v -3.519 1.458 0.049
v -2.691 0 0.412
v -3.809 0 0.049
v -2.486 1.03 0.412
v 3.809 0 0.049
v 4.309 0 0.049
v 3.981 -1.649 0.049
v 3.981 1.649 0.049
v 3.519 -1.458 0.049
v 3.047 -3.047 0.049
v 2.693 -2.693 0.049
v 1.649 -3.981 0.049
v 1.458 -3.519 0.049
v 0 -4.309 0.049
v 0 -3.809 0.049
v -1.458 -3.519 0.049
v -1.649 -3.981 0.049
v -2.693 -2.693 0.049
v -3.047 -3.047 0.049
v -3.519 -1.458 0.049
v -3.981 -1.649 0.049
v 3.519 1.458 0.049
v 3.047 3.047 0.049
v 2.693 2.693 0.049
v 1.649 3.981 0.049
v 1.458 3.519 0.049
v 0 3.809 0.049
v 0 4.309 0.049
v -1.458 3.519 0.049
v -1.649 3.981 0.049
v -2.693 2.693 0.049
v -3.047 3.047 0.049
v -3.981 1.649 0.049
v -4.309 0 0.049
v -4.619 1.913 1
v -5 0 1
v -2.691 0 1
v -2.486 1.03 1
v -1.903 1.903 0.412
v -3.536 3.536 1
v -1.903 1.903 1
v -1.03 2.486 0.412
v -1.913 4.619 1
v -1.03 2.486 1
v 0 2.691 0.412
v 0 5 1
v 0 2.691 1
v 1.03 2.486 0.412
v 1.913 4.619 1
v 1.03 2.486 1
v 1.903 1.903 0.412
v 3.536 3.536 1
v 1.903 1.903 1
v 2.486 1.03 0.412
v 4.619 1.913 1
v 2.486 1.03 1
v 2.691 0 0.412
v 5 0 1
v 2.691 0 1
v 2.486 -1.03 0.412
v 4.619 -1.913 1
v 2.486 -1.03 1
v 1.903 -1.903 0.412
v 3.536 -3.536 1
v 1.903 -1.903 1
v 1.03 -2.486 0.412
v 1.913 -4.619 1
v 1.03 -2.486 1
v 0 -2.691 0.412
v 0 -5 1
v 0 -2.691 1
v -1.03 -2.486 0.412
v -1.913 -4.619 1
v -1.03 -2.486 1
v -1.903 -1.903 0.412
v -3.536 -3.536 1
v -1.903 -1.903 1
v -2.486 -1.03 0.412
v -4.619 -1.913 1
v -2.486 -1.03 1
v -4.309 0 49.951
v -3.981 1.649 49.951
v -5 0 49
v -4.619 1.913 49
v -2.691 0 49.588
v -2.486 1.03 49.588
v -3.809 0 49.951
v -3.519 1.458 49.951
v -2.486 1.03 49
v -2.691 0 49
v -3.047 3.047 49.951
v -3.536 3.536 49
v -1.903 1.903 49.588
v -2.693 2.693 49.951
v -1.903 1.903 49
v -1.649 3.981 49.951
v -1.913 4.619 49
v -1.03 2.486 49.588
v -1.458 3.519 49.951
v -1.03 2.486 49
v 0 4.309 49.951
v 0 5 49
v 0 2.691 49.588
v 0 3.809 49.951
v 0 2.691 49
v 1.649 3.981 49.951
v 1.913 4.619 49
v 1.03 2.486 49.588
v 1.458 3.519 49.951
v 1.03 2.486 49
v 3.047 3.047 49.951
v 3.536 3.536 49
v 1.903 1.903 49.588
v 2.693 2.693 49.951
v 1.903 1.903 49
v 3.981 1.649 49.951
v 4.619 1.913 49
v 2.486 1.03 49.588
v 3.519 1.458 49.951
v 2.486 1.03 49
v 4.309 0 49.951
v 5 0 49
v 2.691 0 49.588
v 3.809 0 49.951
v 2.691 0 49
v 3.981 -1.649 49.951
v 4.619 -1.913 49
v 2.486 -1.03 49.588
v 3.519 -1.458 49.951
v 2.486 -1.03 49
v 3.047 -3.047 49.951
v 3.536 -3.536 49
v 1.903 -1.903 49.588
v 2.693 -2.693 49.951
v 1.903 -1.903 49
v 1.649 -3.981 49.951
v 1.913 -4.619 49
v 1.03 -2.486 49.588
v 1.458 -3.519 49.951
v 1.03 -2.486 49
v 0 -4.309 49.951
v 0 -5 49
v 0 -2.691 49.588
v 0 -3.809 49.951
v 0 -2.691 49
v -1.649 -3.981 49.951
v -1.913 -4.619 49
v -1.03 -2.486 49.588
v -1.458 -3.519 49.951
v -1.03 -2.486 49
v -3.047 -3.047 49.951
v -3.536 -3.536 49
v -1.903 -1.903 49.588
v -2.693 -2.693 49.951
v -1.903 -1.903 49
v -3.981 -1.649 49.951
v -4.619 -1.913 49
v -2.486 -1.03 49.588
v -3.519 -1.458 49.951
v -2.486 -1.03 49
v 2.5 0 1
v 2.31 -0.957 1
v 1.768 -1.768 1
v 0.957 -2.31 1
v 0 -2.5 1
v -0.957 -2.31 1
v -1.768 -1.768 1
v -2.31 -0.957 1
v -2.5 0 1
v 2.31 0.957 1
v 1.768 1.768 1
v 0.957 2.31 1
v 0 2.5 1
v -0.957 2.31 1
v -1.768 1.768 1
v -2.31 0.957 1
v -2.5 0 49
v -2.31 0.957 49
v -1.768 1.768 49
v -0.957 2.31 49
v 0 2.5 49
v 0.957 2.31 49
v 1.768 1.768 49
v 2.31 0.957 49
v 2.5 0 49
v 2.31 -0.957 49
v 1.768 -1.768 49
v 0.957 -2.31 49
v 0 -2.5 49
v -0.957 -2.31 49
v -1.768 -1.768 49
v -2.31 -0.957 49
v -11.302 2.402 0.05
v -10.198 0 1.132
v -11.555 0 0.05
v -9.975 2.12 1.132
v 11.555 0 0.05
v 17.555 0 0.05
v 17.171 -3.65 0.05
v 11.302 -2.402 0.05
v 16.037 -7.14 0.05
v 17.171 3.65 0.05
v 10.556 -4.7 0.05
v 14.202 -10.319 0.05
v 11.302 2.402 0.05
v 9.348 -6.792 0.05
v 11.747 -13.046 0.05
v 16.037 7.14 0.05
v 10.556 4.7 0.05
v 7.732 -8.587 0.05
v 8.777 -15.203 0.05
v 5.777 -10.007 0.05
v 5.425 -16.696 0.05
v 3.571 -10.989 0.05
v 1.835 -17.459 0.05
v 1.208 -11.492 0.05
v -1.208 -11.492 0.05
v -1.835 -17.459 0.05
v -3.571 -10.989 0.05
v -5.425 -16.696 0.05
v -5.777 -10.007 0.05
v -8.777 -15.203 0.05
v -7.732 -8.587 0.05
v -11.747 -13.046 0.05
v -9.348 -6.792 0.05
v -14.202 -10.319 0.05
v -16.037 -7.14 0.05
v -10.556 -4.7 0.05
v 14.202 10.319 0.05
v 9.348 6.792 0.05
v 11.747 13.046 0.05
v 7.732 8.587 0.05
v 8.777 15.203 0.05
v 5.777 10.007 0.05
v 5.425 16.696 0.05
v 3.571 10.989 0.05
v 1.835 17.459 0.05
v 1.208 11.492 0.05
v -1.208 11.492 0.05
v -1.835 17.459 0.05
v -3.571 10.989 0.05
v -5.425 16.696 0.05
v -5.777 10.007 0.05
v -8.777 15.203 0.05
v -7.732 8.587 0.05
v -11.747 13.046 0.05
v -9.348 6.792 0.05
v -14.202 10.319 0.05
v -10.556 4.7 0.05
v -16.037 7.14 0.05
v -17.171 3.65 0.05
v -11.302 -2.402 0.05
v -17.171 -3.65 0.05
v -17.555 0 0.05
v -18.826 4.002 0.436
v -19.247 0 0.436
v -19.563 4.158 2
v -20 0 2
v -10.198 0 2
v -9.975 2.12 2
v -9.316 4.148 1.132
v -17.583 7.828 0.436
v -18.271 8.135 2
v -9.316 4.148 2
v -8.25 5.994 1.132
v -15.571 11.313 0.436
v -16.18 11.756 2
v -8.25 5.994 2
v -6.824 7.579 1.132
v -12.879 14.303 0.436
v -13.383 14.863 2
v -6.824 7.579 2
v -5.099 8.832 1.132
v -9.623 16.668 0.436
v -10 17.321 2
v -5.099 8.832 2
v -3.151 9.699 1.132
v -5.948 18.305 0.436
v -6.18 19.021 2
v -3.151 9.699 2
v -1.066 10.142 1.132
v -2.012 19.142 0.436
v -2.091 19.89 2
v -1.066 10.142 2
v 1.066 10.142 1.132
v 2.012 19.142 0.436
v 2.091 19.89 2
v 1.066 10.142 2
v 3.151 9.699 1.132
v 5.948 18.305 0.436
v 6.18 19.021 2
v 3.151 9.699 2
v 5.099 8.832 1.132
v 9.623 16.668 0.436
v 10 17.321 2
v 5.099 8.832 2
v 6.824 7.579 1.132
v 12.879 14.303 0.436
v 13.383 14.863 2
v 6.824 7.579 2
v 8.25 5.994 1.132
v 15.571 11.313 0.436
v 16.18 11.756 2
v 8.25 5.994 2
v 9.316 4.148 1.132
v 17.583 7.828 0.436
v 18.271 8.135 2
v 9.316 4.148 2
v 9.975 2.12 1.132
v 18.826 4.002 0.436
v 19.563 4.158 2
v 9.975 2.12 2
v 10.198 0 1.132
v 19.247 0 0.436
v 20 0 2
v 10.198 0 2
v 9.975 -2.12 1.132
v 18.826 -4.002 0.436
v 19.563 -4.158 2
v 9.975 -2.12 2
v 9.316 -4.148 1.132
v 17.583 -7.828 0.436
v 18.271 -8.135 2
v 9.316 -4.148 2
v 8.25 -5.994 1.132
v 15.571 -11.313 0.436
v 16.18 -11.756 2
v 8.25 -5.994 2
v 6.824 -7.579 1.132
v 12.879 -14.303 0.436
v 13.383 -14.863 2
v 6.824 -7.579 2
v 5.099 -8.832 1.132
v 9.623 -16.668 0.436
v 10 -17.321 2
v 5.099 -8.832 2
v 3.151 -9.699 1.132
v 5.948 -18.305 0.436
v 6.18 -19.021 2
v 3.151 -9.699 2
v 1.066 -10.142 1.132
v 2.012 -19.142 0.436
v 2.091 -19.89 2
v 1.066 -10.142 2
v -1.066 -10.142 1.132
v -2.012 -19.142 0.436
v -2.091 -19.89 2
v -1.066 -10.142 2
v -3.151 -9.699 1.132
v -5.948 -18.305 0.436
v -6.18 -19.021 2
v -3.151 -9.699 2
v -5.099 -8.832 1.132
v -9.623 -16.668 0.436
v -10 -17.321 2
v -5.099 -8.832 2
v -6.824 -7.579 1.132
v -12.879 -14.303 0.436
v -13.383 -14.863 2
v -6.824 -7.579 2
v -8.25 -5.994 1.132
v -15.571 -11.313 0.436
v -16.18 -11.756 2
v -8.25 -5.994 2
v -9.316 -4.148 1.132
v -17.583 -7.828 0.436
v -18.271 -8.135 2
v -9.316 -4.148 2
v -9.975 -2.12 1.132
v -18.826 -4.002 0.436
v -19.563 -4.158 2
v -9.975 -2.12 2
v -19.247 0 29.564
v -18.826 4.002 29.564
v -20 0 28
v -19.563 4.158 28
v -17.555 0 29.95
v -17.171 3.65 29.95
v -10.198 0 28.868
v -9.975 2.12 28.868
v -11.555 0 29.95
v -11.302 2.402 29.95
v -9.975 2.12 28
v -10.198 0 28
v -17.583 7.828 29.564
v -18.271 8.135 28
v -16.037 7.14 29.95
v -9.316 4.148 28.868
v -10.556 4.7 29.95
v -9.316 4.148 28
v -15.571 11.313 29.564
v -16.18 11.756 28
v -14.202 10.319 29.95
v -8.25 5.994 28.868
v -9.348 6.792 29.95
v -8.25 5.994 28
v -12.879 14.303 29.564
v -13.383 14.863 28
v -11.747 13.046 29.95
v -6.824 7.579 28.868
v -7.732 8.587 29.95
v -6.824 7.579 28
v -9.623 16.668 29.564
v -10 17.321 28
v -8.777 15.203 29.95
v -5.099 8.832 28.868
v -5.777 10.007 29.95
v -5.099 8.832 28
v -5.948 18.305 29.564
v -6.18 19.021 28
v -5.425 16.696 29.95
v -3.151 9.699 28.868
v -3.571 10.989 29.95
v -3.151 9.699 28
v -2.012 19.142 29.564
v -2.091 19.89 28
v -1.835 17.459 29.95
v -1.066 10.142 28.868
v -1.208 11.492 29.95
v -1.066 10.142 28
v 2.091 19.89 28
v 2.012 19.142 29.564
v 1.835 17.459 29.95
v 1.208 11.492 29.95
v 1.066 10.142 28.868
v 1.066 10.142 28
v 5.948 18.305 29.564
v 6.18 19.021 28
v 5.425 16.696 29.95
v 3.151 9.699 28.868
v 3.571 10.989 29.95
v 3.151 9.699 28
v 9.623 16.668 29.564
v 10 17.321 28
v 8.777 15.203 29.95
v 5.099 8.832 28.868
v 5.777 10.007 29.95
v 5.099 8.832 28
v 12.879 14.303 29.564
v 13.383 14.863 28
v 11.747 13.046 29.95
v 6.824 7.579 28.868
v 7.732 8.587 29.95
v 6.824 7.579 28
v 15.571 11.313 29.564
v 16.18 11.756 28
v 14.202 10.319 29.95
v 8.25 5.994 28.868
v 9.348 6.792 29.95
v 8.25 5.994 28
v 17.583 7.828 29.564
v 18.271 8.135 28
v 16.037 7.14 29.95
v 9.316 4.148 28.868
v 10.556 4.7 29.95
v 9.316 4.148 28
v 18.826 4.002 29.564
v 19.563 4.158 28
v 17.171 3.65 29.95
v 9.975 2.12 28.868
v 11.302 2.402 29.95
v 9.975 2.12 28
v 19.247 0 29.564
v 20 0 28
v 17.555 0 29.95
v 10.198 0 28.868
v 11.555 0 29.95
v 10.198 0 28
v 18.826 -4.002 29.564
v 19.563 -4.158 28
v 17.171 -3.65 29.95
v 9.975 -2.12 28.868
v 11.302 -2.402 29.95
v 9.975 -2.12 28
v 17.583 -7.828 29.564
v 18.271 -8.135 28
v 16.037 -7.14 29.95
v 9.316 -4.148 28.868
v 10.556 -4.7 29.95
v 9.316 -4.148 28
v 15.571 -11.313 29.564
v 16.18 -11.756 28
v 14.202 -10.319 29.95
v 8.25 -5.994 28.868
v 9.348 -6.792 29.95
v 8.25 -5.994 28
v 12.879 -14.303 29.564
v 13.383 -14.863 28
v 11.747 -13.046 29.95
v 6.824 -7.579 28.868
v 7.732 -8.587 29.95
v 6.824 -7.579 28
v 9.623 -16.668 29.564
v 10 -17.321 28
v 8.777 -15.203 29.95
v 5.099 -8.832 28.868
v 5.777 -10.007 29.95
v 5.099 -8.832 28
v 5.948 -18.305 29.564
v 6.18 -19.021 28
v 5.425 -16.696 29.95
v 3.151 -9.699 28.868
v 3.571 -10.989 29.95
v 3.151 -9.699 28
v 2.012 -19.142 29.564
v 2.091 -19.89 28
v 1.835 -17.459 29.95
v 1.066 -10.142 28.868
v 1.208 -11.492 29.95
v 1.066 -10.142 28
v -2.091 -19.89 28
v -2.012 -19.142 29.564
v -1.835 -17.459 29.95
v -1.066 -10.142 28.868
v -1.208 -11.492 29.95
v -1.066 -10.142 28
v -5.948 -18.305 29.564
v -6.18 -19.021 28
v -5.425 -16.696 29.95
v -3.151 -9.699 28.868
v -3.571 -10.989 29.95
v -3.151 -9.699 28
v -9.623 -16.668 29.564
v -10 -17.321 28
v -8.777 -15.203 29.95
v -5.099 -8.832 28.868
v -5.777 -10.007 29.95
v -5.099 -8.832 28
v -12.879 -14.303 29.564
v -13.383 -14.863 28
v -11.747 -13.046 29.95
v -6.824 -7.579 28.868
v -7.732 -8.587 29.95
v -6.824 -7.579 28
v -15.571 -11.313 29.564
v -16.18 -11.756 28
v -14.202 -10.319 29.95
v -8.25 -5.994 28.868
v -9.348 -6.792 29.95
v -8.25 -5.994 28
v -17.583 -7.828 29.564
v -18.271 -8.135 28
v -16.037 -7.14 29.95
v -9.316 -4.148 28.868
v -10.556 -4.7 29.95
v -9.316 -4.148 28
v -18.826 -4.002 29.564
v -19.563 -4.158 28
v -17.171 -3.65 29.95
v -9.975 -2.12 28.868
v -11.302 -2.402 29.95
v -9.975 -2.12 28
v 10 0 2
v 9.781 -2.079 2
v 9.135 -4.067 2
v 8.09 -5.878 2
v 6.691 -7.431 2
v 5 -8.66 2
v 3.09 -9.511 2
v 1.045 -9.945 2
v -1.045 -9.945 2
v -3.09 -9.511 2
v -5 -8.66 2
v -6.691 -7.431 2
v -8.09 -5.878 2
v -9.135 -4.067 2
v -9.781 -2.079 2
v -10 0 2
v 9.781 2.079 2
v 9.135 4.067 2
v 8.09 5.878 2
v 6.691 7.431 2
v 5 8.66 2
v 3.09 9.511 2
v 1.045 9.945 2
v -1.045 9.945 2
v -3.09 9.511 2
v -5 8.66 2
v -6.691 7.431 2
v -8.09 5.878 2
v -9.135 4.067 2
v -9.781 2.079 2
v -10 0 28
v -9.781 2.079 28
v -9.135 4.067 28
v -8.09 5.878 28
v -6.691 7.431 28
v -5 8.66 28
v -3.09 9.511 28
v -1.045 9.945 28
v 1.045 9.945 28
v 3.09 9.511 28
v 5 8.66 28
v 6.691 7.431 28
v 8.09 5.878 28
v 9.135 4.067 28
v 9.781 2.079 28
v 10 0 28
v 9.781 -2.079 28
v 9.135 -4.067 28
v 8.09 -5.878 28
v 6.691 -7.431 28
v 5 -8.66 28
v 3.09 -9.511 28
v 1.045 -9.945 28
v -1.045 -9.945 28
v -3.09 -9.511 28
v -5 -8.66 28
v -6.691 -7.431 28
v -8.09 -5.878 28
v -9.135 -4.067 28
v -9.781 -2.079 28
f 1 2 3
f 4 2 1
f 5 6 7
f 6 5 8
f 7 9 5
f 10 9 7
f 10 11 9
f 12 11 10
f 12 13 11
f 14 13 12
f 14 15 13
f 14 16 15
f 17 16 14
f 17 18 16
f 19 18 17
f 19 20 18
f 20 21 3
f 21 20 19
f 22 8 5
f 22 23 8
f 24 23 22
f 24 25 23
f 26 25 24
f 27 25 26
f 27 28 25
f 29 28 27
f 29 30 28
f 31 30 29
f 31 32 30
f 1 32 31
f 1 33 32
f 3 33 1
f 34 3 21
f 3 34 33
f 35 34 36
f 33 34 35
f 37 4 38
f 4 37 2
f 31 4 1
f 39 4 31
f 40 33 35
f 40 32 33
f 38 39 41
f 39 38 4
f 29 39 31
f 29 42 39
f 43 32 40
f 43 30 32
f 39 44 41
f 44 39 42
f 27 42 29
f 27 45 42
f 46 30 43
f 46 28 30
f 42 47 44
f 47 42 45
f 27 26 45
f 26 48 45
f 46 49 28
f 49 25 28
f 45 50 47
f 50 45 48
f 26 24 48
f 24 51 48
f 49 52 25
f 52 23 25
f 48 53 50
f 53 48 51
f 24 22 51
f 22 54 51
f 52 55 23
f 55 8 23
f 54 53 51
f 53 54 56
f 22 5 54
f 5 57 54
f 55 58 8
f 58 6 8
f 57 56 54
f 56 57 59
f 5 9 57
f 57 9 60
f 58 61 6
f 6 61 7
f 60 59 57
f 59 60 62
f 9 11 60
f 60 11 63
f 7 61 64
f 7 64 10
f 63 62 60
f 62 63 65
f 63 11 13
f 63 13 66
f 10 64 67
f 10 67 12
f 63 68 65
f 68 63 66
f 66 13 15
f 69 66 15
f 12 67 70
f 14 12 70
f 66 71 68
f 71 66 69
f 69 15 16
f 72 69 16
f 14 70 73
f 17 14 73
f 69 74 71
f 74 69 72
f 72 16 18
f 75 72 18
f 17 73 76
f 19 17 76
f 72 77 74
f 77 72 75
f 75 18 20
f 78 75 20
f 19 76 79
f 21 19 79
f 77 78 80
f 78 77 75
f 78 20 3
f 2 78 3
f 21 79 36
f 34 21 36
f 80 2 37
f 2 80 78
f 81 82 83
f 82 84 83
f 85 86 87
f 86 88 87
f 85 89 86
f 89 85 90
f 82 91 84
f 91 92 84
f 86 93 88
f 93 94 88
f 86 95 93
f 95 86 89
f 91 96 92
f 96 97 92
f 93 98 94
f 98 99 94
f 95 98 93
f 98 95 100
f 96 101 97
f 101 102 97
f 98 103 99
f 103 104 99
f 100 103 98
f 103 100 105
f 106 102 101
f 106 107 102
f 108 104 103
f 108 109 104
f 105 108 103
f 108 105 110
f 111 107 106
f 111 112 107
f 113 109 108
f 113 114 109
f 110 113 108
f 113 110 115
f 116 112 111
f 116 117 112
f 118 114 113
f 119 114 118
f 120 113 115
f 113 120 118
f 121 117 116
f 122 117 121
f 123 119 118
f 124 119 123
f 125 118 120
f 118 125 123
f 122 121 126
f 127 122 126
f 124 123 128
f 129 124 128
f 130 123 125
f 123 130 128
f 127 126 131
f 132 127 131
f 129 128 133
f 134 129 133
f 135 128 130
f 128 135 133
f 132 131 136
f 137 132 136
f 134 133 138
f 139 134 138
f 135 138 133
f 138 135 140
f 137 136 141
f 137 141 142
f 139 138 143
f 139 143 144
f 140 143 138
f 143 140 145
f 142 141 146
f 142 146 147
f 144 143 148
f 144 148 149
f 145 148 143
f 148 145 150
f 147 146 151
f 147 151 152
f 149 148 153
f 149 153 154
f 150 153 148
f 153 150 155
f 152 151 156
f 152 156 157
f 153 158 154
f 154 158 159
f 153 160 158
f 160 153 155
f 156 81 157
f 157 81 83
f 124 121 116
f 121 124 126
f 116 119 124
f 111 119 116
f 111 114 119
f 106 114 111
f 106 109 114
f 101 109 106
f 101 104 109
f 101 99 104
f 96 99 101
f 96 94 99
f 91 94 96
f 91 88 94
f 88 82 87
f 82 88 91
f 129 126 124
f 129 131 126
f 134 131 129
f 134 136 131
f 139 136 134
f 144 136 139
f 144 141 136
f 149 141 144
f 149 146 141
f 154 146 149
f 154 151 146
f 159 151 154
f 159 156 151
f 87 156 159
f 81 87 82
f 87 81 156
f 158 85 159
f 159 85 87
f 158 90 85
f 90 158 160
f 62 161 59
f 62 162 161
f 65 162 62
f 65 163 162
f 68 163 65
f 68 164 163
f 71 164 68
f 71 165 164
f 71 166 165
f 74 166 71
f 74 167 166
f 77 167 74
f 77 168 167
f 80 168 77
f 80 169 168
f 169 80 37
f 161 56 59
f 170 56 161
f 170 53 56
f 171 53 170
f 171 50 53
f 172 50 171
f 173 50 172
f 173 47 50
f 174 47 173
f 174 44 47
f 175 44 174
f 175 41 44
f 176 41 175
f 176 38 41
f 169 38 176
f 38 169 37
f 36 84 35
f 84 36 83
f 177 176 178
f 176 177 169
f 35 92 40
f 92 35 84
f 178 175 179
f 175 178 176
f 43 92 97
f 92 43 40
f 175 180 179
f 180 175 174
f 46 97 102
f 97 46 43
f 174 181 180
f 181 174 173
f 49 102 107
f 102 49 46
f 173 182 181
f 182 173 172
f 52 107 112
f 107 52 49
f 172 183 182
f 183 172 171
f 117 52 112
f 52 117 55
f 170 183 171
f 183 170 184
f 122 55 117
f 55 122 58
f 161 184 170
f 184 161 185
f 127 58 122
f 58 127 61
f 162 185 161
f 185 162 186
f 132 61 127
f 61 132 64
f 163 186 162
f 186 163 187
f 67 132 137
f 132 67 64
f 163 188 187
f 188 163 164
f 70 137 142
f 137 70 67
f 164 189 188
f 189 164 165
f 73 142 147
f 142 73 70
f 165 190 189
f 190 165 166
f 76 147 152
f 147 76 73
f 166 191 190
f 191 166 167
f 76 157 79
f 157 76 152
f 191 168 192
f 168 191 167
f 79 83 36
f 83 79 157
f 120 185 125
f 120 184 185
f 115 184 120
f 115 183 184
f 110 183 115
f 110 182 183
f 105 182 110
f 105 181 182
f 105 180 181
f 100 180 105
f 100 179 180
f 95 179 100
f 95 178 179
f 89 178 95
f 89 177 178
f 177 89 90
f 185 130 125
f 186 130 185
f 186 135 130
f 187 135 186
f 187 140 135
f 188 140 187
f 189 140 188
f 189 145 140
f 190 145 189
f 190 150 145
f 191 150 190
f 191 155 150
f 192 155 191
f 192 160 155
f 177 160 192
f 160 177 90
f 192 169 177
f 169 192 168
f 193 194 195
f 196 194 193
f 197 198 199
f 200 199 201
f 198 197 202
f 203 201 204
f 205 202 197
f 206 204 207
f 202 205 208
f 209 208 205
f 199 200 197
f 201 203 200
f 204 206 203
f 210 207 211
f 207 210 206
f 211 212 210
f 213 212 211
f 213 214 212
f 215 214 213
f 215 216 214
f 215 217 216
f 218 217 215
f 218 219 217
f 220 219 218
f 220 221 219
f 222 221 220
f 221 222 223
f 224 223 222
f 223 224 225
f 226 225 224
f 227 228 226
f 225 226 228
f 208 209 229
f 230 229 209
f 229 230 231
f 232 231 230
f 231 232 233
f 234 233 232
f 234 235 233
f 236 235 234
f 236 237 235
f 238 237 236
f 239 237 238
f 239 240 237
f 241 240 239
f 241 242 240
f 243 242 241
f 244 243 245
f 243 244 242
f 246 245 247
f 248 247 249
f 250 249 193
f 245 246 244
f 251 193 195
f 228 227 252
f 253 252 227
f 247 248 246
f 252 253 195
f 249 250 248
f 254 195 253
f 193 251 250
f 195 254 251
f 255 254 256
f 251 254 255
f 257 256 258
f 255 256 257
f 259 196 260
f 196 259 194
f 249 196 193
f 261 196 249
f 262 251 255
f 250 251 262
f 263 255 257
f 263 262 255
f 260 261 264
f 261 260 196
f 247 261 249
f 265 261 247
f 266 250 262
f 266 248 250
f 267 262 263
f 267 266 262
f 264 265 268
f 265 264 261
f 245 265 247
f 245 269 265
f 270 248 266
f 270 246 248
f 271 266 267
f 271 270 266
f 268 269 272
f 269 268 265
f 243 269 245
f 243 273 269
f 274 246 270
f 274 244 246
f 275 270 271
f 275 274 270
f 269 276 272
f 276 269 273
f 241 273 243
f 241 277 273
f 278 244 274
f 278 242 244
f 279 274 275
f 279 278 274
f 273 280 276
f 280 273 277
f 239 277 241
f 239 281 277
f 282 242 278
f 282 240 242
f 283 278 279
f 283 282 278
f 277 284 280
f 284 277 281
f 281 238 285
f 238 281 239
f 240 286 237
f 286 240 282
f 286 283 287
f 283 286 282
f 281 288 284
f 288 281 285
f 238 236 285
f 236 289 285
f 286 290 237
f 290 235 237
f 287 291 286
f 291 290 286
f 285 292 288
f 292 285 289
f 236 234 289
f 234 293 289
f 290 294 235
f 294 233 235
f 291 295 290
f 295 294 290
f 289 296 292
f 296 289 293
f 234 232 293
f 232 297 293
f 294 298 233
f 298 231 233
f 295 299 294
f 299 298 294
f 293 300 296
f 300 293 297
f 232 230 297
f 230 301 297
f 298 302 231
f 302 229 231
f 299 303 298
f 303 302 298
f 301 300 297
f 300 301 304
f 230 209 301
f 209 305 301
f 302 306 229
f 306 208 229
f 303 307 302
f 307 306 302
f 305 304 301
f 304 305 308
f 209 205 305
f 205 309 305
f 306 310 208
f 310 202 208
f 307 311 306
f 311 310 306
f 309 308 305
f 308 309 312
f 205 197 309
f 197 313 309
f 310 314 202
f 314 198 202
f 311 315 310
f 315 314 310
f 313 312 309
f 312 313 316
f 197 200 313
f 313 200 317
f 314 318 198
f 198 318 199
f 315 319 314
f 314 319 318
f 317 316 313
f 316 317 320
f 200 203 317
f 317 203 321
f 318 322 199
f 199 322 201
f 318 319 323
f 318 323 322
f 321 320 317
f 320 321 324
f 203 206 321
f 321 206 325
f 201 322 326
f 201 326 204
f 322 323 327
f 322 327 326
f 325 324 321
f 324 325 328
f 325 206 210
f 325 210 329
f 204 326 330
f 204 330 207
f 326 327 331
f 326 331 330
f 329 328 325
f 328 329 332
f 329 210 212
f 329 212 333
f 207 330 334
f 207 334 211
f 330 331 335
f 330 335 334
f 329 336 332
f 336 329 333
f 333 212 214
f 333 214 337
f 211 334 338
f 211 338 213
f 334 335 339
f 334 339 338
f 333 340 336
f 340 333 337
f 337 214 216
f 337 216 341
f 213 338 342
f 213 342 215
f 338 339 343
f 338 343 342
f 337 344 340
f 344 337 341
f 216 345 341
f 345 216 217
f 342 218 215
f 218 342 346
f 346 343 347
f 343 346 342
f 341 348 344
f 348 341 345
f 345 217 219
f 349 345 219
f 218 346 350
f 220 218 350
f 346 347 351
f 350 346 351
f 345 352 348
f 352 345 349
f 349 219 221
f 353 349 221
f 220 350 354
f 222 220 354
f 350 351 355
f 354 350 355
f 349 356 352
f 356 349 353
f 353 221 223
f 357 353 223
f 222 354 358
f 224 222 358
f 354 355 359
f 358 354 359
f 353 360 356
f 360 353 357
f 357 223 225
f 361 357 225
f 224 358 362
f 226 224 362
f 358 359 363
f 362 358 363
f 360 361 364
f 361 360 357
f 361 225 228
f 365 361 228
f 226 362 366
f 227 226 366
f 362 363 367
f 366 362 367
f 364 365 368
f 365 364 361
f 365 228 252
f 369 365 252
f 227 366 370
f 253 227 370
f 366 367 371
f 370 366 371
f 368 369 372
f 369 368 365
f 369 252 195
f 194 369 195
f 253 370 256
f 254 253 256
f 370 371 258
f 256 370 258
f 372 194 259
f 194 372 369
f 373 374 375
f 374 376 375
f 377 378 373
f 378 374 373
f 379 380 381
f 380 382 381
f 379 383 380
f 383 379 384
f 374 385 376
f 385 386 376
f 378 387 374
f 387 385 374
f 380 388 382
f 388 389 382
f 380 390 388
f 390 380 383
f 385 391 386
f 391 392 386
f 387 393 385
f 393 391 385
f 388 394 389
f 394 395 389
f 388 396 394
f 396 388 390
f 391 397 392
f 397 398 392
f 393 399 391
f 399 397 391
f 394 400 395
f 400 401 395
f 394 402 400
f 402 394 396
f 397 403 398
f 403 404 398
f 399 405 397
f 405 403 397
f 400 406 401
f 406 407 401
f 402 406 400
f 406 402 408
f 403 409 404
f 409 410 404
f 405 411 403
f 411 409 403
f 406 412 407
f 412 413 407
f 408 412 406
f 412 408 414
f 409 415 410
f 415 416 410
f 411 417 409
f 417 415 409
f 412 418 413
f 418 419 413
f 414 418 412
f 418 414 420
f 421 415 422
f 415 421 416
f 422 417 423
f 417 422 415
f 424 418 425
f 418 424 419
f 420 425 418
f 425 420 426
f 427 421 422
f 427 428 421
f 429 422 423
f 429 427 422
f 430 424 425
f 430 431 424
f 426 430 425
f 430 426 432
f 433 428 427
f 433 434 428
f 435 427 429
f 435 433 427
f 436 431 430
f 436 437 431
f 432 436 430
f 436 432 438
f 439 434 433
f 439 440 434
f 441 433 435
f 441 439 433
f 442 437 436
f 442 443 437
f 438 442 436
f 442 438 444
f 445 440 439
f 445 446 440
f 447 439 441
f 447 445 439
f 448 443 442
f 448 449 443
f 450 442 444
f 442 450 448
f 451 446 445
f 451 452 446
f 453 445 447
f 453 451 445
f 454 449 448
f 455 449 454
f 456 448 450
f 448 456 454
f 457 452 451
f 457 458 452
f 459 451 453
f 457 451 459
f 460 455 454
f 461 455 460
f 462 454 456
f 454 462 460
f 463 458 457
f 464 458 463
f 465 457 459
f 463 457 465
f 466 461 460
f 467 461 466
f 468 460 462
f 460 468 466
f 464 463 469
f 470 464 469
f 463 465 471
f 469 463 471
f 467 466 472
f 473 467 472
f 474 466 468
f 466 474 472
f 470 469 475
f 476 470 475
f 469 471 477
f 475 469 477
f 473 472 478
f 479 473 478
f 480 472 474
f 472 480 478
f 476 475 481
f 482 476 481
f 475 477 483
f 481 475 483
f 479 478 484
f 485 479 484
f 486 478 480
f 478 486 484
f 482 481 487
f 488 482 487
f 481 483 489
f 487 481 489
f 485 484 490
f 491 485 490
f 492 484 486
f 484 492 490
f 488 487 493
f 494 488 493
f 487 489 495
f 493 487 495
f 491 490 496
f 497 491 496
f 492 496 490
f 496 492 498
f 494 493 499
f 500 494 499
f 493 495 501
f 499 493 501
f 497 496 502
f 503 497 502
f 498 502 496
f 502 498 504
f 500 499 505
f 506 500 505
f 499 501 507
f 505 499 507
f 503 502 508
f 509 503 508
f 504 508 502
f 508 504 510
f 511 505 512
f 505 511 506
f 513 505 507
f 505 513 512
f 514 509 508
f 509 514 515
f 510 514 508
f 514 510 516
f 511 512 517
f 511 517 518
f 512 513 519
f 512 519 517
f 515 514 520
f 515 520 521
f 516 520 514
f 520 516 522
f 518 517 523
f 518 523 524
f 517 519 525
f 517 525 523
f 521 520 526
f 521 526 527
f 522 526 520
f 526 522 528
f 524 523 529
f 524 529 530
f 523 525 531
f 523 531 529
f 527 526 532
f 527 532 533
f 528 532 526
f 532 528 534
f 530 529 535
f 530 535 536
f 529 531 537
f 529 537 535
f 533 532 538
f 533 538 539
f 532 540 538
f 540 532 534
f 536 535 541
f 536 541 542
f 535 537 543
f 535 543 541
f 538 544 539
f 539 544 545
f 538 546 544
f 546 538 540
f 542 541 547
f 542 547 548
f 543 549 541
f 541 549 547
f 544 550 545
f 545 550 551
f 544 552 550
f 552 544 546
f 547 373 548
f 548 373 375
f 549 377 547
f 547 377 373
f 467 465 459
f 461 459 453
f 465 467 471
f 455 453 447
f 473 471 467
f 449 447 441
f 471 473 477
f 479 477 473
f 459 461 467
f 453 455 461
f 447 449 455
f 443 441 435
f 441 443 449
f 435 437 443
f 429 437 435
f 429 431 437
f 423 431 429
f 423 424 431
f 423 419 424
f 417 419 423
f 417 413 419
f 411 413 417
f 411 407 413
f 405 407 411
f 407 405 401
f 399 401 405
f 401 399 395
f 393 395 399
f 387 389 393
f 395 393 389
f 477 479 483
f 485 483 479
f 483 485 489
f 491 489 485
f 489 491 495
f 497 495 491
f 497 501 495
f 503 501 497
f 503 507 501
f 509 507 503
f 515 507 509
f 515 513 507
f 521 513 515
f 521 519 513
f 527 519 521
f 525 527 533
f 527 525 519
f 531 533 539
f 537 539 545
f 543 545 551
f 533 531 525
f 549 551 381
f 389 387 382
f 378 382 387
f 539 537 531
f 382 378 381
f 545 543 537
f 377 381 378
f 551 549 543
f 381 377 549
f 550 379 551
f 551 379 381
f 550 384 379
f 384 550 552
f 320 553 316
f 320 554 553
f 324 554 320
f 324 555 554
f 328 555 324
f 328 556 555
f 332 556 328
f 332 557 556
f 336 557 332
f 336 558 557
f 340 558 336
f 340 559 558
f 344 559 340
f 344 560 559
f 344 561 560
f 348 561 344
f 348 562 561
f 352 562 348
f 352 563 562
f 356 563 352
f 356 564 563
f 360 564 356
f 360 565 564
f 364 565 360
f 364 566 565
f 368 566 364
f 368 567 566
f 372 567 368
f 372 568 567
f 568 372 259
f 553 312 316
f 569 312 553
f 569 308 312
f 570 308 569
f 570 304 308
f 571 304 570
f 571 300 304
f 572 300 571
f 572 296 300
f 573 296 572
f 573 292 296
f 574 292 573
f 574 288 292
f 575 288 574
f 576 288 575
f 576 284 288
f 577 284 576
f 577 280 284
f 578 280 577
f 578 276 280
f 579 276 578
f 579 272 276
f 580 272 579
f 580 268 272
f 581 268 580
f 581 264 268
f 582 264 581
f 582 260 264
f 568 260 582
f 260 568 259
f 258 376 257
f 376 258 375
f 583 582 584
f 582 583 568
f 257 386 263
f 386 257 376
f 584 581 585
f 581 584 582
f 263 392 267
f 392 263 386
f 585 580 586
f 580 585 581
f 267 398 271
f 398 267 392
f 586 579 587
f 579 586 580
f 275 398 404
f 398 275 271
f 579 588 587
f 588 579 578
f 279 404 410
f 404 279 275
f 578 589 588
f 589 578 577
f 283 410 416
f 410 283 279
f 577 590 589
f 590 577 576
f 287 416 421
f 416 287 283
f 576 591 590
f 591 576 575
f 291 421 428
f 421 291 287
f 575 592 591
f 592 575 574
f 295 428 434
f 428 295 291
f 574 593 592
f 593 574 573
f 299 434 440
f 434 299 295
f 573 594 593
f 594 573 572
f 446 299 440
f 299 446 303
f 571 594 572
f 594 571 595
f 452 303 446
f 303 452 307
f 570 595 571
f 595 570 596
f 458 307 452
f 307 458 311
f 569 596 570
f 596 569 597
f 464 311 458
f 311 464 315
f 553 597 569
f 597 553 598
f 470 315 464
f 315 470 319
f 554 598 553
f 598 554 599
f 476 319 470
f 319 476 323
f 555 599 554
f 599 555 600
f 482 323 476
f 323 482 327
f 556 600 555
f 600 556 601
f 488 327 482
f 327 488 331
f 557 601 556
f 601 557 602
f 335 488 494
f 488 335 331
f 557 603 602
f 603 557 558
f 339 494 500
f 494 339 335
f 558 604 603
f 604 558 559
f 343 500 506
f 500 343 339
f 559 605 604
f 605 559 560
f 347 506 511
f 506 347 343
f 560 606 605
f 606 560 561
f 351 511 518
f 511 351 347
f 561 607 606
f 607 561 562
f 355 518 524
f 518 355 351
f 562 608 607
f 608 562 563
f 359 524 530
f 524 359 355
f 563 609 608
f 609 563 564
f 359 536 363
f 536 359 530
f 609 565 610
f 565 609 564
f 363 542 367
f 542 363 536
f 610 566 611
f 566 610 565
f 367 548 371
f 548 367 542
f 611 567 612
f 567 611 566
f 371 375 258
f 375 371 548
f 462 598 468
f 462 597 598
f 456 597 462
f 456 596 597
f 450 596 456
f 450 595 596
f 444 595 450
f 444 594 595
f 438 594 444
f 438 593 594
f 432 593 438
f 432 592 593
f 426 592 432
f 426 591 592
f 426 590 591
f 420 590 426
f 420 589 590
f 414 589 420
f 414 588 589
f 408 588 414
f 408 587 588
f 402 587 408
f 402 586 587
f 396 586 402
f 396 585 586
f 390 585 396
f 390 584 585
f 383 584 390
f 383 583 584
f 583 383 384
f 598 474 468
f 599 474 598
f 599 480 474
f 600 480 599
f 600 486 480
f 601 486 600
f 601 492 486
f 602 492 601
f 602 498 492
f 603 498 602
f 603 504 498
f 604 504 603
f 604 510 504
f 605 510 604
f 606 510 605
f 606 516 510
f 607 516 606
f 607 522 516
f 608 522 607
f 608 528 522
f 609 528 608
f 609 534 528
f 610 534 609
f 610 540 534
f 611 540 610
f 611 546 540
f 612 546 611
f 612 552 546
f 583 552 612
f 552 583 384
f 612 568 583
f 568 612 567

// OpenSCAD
module tube(od, id, h, r = 2) {
    
    color("green") 
    translate([0, 0, r]) 
        rotate_extrude() 
            translate([id / 2 + ((od - id) / 4), 0, 0])  
                    hull() {
                        translate([((od - id) / 4) - r, 0, 0]) 
                            circle(r = r);
                        translate([-1 * (((od - id) / 4) - r), 0, 0])
                            circle(r = r);
                    }
                
            
    color("red")
    translate([0, 0, h - r])
        rotate_extrude() 
            translate([id / 2 + ((od - id) / 4), 0, 0])  
                    hull() {
                        translate([((od - id) / 4) - r, 0, 0]) 
                            circle(r = r);
                        translate([-1 * (((od - id) / 4) - r), 0, 0])
                            circle(r = r);
                    }
                    
    color("blue")
    translate([0, 0,  (h / 2)])
        rotate_extrude() 
            translate([(id / 2) + ((od - id) / 4), 0, 0])
                square([(od - id) / 2, h - (r * 2)], center = true);
                
            
        
    

   
}

// $fn = 25;

tube(od = 10, id = 5, h = 50, r = 1);


tube(od = 40, id = 20, h = 30);
